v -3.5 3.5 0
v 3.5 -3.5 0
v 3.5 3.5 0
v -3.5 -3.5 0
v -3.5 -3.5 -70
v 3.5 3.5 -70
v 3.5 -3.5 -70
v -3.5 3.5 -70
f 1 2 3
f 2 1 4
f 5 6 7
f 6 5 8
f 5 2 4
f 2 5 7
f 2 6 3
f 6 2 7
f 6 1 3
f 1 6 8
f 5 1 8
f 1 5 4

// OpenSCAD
module pied_carre_long()
{
	translate([0,0,-35])
cube(size = [7,7,70], center = true);

}

pied_carre_long();
